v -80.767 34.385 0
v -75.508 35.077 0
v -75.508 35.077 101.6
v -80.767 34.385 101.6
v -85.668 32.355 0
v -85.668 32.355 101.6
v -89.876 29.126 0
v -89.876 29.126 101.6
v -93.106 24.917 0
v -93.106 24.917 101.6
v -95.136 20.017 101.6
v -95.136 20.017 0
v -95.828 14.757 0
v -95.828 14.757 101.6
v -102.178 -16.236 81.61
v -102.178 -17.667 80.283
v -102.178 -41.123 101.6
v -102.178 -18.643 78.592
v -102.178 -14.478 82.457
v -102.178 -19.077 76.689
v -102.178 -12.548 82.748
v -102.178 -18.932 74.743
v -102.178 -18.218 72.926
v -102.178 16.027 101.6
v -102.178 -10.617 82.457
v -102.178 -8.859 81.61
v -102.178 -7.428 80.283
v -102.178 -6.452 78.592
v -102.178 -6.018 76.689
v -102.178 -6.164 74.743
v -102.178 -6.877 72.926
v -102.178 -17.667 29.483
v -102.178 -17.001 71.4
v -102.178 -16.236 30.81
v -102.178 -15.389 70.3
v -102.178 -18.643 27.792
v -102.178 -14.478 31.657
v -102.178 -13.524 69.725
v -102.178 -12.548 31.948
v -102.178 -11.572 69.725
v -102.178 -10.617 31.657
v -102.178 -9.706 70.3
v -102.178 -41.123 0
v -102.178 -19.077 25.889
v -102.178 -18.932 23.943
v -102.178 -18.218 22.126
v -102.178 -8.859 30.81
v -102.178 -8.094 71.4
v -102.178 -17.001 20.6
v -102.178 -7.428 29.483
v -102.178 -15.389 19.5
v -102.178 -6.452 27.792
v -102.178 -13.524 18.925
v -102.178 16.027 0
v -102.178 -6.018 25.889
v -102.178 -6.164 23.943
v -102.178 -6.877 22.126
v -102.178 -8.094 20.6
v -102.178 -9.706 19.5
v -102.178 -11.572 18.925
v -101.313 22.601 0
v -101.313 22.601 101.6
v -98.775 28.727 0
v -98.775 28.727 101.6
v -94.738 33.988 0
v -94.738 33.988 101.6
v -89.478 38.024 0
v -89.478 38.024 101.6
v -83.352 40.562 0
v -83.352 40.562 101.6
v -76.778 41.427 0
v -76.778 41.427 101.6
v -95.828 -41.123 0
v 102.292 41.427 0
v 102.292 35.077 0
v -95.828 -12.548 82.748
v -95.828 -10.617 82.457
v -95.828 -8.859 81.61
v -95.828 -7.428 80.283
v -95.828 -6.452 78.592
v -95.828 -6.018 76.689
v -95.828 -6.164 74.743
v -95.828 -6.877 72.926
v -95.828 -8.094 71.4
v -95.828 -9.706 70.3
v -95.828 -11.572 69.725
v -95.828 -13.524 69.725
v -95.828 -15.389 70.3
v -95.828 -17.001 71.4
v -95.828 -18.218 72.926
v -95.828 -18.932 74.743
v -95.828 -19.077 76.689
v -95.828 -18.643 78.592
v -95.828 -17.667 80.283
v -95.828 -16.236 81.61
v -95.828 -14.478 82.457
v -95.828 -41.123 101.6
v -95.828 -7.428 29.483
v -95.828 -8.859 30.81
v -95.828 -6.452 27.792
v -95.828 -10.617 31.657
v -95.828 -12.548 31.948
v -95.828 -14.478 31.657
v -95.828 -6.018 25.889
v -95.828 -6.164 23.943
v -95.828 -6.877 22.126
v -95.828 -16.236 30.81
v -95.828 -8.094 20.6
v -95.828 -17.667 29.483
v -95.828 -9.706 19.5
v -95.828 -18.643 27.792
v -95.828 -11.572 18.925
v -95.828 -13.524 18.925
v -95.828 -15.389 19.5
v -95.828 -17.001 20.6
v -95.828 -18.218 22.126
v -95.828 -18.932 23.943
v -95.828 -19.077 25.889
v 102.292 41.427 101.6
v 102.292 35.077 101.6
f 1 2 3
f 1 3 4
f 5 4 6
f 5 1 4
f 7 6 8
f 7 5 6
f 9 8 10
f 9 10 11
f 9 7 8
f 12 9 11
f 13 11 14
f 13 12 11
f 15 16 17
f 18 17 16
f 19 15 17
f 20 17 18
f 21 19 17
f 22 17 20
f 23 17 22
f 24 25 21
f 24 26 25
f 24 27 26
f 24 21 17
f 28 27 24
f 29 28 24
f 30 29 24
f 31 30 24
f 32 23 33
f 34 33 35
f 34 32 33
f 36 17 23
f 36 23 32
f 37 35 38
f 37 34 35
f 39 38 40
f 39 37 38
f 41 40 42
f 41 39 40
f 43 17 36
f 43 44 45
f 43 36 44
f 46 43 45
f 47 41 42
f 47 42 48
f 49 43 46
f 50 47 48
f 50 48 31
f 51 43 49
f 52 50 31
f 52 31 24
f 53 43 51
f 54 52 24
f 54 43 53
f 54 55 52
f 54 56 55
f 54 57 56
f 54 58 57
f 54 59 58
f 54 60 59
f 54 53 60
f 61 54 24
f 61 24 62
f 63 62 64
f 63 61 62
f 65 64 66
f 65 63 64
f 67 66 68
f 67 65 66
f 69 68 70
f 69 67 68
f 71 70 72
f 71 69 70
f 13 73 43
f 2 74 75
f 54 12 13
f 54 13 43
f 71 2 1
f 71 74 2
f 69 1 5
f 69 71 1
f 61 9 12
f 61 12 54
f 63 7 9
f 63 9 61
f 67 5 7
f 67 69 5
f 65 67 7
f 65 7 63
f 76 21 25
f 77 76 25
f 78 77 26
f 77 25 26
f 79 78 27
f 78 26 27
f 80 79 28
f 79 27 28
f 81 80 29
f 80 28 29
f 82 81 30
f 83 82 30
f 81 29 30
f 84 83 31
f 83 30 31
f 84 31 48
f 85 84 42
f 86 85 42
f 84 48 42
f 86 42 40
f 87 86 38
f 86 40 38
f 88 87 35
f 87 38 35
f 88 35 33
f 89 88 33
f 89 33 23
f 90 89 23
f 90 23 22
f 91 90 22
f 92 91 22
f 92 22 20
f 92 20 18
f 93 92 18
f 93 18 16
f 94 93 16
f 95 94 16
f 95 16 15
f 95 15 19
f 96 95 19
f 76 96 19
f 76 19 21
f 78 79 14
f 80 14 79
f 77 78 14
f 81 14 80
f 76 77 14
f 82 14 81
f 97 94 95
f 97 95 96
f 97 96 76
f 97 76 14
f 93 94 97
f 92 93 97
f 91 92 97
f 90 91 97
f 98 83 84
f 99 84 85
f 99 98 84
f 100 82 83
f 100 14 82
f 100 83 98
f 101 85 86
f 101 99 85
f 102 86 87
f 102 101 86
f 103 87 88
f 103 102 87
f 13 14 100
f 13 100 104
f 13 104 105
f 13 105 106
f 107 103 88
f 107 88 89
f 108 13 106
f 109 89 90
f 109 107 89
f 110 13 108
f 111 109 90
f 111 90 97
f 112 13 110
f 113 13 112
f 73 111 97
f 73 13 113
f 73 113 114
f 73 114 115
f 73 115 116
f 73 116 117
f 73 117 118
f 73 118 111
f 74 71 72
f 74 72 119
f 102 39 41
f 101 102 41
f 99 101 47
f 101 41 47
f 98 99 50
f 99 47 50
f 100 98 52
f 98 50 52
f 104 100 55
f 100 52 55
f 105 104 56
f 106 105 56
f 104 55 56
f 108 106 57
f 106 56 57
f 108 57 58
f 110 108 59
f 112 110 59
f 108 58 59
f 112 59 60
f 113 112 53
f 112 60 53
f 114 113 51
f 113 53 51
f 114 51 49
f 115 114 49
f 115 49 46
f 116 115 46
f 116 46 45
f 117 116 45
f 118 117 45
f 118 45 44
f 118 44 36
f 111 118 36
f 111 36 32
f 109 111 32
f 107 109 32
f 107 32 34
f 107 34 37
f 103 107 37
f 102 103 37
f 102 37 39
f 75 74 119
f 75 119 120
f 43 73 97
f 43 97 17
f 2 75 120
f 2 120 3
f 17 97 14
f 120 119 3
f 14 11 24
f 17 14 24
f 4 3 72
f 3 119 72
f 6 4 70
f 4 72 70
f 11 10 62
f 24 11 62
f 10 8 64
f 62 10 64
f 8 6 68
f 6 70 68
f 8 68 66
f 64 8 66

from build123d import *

# Parameters (mm, degrees)
BOSS_EXTRUDE1_DEPTH = 101.6
SKETCH2_R           = 6.54812
CUT_EXTRUDE1_DEPTH  = 304.8


with BuildPart() as part:
    # Sketch1 → Boss-Extrude1 (new body)
    with BuildSketch(Plane.XY):
        with BuildLine():
            Line((-76.777987096, 41.427423626), (102.292012904, 41.427423626))
            Line((102.292012904, 41.427423626), (102.292012904, 35.077423626))
            Line((102.292012904, 35.077423626), (-75.507987096, 35.077423626))
            ThreePointArc((-75.507987096, 35.077423626), (-89.87639689, 29.12583342), (-95.827987096, 14.757423626))
            Line((-95.827987096, 14.757423626), (-95.827987096, -41.122576374))
            Line((-95.827987096, -41.122576374), (-102.177987096, -41.122576374))
            Line((-102.177987096, -41.122576374), (-102.177987096, 16.027423626))
            ThreePointArc((-102.177987096, 16.027423626), (-94.738499338, 33.987935868), (-76.777987096, 41.427423626))
        make_face()
    extrude(amount=BOSS_EXTRUDE1_DEPTH)

    # Sketch2 → Cut-Extrude1 (cut)
    with BuildSketch(Plane.ZY.offset(102.177987096)):
        with Locations((25.4, -12.547576374)):
            Circle(SKETCH2_R)
        with Locations((76.2, -12.547576374)):
            Circle(SKETCH2_R)
    extrude(amount=-CUT_EXTRUDE1_DEPTH, mode=Mode.SUBTRACT)


solid = part.part
